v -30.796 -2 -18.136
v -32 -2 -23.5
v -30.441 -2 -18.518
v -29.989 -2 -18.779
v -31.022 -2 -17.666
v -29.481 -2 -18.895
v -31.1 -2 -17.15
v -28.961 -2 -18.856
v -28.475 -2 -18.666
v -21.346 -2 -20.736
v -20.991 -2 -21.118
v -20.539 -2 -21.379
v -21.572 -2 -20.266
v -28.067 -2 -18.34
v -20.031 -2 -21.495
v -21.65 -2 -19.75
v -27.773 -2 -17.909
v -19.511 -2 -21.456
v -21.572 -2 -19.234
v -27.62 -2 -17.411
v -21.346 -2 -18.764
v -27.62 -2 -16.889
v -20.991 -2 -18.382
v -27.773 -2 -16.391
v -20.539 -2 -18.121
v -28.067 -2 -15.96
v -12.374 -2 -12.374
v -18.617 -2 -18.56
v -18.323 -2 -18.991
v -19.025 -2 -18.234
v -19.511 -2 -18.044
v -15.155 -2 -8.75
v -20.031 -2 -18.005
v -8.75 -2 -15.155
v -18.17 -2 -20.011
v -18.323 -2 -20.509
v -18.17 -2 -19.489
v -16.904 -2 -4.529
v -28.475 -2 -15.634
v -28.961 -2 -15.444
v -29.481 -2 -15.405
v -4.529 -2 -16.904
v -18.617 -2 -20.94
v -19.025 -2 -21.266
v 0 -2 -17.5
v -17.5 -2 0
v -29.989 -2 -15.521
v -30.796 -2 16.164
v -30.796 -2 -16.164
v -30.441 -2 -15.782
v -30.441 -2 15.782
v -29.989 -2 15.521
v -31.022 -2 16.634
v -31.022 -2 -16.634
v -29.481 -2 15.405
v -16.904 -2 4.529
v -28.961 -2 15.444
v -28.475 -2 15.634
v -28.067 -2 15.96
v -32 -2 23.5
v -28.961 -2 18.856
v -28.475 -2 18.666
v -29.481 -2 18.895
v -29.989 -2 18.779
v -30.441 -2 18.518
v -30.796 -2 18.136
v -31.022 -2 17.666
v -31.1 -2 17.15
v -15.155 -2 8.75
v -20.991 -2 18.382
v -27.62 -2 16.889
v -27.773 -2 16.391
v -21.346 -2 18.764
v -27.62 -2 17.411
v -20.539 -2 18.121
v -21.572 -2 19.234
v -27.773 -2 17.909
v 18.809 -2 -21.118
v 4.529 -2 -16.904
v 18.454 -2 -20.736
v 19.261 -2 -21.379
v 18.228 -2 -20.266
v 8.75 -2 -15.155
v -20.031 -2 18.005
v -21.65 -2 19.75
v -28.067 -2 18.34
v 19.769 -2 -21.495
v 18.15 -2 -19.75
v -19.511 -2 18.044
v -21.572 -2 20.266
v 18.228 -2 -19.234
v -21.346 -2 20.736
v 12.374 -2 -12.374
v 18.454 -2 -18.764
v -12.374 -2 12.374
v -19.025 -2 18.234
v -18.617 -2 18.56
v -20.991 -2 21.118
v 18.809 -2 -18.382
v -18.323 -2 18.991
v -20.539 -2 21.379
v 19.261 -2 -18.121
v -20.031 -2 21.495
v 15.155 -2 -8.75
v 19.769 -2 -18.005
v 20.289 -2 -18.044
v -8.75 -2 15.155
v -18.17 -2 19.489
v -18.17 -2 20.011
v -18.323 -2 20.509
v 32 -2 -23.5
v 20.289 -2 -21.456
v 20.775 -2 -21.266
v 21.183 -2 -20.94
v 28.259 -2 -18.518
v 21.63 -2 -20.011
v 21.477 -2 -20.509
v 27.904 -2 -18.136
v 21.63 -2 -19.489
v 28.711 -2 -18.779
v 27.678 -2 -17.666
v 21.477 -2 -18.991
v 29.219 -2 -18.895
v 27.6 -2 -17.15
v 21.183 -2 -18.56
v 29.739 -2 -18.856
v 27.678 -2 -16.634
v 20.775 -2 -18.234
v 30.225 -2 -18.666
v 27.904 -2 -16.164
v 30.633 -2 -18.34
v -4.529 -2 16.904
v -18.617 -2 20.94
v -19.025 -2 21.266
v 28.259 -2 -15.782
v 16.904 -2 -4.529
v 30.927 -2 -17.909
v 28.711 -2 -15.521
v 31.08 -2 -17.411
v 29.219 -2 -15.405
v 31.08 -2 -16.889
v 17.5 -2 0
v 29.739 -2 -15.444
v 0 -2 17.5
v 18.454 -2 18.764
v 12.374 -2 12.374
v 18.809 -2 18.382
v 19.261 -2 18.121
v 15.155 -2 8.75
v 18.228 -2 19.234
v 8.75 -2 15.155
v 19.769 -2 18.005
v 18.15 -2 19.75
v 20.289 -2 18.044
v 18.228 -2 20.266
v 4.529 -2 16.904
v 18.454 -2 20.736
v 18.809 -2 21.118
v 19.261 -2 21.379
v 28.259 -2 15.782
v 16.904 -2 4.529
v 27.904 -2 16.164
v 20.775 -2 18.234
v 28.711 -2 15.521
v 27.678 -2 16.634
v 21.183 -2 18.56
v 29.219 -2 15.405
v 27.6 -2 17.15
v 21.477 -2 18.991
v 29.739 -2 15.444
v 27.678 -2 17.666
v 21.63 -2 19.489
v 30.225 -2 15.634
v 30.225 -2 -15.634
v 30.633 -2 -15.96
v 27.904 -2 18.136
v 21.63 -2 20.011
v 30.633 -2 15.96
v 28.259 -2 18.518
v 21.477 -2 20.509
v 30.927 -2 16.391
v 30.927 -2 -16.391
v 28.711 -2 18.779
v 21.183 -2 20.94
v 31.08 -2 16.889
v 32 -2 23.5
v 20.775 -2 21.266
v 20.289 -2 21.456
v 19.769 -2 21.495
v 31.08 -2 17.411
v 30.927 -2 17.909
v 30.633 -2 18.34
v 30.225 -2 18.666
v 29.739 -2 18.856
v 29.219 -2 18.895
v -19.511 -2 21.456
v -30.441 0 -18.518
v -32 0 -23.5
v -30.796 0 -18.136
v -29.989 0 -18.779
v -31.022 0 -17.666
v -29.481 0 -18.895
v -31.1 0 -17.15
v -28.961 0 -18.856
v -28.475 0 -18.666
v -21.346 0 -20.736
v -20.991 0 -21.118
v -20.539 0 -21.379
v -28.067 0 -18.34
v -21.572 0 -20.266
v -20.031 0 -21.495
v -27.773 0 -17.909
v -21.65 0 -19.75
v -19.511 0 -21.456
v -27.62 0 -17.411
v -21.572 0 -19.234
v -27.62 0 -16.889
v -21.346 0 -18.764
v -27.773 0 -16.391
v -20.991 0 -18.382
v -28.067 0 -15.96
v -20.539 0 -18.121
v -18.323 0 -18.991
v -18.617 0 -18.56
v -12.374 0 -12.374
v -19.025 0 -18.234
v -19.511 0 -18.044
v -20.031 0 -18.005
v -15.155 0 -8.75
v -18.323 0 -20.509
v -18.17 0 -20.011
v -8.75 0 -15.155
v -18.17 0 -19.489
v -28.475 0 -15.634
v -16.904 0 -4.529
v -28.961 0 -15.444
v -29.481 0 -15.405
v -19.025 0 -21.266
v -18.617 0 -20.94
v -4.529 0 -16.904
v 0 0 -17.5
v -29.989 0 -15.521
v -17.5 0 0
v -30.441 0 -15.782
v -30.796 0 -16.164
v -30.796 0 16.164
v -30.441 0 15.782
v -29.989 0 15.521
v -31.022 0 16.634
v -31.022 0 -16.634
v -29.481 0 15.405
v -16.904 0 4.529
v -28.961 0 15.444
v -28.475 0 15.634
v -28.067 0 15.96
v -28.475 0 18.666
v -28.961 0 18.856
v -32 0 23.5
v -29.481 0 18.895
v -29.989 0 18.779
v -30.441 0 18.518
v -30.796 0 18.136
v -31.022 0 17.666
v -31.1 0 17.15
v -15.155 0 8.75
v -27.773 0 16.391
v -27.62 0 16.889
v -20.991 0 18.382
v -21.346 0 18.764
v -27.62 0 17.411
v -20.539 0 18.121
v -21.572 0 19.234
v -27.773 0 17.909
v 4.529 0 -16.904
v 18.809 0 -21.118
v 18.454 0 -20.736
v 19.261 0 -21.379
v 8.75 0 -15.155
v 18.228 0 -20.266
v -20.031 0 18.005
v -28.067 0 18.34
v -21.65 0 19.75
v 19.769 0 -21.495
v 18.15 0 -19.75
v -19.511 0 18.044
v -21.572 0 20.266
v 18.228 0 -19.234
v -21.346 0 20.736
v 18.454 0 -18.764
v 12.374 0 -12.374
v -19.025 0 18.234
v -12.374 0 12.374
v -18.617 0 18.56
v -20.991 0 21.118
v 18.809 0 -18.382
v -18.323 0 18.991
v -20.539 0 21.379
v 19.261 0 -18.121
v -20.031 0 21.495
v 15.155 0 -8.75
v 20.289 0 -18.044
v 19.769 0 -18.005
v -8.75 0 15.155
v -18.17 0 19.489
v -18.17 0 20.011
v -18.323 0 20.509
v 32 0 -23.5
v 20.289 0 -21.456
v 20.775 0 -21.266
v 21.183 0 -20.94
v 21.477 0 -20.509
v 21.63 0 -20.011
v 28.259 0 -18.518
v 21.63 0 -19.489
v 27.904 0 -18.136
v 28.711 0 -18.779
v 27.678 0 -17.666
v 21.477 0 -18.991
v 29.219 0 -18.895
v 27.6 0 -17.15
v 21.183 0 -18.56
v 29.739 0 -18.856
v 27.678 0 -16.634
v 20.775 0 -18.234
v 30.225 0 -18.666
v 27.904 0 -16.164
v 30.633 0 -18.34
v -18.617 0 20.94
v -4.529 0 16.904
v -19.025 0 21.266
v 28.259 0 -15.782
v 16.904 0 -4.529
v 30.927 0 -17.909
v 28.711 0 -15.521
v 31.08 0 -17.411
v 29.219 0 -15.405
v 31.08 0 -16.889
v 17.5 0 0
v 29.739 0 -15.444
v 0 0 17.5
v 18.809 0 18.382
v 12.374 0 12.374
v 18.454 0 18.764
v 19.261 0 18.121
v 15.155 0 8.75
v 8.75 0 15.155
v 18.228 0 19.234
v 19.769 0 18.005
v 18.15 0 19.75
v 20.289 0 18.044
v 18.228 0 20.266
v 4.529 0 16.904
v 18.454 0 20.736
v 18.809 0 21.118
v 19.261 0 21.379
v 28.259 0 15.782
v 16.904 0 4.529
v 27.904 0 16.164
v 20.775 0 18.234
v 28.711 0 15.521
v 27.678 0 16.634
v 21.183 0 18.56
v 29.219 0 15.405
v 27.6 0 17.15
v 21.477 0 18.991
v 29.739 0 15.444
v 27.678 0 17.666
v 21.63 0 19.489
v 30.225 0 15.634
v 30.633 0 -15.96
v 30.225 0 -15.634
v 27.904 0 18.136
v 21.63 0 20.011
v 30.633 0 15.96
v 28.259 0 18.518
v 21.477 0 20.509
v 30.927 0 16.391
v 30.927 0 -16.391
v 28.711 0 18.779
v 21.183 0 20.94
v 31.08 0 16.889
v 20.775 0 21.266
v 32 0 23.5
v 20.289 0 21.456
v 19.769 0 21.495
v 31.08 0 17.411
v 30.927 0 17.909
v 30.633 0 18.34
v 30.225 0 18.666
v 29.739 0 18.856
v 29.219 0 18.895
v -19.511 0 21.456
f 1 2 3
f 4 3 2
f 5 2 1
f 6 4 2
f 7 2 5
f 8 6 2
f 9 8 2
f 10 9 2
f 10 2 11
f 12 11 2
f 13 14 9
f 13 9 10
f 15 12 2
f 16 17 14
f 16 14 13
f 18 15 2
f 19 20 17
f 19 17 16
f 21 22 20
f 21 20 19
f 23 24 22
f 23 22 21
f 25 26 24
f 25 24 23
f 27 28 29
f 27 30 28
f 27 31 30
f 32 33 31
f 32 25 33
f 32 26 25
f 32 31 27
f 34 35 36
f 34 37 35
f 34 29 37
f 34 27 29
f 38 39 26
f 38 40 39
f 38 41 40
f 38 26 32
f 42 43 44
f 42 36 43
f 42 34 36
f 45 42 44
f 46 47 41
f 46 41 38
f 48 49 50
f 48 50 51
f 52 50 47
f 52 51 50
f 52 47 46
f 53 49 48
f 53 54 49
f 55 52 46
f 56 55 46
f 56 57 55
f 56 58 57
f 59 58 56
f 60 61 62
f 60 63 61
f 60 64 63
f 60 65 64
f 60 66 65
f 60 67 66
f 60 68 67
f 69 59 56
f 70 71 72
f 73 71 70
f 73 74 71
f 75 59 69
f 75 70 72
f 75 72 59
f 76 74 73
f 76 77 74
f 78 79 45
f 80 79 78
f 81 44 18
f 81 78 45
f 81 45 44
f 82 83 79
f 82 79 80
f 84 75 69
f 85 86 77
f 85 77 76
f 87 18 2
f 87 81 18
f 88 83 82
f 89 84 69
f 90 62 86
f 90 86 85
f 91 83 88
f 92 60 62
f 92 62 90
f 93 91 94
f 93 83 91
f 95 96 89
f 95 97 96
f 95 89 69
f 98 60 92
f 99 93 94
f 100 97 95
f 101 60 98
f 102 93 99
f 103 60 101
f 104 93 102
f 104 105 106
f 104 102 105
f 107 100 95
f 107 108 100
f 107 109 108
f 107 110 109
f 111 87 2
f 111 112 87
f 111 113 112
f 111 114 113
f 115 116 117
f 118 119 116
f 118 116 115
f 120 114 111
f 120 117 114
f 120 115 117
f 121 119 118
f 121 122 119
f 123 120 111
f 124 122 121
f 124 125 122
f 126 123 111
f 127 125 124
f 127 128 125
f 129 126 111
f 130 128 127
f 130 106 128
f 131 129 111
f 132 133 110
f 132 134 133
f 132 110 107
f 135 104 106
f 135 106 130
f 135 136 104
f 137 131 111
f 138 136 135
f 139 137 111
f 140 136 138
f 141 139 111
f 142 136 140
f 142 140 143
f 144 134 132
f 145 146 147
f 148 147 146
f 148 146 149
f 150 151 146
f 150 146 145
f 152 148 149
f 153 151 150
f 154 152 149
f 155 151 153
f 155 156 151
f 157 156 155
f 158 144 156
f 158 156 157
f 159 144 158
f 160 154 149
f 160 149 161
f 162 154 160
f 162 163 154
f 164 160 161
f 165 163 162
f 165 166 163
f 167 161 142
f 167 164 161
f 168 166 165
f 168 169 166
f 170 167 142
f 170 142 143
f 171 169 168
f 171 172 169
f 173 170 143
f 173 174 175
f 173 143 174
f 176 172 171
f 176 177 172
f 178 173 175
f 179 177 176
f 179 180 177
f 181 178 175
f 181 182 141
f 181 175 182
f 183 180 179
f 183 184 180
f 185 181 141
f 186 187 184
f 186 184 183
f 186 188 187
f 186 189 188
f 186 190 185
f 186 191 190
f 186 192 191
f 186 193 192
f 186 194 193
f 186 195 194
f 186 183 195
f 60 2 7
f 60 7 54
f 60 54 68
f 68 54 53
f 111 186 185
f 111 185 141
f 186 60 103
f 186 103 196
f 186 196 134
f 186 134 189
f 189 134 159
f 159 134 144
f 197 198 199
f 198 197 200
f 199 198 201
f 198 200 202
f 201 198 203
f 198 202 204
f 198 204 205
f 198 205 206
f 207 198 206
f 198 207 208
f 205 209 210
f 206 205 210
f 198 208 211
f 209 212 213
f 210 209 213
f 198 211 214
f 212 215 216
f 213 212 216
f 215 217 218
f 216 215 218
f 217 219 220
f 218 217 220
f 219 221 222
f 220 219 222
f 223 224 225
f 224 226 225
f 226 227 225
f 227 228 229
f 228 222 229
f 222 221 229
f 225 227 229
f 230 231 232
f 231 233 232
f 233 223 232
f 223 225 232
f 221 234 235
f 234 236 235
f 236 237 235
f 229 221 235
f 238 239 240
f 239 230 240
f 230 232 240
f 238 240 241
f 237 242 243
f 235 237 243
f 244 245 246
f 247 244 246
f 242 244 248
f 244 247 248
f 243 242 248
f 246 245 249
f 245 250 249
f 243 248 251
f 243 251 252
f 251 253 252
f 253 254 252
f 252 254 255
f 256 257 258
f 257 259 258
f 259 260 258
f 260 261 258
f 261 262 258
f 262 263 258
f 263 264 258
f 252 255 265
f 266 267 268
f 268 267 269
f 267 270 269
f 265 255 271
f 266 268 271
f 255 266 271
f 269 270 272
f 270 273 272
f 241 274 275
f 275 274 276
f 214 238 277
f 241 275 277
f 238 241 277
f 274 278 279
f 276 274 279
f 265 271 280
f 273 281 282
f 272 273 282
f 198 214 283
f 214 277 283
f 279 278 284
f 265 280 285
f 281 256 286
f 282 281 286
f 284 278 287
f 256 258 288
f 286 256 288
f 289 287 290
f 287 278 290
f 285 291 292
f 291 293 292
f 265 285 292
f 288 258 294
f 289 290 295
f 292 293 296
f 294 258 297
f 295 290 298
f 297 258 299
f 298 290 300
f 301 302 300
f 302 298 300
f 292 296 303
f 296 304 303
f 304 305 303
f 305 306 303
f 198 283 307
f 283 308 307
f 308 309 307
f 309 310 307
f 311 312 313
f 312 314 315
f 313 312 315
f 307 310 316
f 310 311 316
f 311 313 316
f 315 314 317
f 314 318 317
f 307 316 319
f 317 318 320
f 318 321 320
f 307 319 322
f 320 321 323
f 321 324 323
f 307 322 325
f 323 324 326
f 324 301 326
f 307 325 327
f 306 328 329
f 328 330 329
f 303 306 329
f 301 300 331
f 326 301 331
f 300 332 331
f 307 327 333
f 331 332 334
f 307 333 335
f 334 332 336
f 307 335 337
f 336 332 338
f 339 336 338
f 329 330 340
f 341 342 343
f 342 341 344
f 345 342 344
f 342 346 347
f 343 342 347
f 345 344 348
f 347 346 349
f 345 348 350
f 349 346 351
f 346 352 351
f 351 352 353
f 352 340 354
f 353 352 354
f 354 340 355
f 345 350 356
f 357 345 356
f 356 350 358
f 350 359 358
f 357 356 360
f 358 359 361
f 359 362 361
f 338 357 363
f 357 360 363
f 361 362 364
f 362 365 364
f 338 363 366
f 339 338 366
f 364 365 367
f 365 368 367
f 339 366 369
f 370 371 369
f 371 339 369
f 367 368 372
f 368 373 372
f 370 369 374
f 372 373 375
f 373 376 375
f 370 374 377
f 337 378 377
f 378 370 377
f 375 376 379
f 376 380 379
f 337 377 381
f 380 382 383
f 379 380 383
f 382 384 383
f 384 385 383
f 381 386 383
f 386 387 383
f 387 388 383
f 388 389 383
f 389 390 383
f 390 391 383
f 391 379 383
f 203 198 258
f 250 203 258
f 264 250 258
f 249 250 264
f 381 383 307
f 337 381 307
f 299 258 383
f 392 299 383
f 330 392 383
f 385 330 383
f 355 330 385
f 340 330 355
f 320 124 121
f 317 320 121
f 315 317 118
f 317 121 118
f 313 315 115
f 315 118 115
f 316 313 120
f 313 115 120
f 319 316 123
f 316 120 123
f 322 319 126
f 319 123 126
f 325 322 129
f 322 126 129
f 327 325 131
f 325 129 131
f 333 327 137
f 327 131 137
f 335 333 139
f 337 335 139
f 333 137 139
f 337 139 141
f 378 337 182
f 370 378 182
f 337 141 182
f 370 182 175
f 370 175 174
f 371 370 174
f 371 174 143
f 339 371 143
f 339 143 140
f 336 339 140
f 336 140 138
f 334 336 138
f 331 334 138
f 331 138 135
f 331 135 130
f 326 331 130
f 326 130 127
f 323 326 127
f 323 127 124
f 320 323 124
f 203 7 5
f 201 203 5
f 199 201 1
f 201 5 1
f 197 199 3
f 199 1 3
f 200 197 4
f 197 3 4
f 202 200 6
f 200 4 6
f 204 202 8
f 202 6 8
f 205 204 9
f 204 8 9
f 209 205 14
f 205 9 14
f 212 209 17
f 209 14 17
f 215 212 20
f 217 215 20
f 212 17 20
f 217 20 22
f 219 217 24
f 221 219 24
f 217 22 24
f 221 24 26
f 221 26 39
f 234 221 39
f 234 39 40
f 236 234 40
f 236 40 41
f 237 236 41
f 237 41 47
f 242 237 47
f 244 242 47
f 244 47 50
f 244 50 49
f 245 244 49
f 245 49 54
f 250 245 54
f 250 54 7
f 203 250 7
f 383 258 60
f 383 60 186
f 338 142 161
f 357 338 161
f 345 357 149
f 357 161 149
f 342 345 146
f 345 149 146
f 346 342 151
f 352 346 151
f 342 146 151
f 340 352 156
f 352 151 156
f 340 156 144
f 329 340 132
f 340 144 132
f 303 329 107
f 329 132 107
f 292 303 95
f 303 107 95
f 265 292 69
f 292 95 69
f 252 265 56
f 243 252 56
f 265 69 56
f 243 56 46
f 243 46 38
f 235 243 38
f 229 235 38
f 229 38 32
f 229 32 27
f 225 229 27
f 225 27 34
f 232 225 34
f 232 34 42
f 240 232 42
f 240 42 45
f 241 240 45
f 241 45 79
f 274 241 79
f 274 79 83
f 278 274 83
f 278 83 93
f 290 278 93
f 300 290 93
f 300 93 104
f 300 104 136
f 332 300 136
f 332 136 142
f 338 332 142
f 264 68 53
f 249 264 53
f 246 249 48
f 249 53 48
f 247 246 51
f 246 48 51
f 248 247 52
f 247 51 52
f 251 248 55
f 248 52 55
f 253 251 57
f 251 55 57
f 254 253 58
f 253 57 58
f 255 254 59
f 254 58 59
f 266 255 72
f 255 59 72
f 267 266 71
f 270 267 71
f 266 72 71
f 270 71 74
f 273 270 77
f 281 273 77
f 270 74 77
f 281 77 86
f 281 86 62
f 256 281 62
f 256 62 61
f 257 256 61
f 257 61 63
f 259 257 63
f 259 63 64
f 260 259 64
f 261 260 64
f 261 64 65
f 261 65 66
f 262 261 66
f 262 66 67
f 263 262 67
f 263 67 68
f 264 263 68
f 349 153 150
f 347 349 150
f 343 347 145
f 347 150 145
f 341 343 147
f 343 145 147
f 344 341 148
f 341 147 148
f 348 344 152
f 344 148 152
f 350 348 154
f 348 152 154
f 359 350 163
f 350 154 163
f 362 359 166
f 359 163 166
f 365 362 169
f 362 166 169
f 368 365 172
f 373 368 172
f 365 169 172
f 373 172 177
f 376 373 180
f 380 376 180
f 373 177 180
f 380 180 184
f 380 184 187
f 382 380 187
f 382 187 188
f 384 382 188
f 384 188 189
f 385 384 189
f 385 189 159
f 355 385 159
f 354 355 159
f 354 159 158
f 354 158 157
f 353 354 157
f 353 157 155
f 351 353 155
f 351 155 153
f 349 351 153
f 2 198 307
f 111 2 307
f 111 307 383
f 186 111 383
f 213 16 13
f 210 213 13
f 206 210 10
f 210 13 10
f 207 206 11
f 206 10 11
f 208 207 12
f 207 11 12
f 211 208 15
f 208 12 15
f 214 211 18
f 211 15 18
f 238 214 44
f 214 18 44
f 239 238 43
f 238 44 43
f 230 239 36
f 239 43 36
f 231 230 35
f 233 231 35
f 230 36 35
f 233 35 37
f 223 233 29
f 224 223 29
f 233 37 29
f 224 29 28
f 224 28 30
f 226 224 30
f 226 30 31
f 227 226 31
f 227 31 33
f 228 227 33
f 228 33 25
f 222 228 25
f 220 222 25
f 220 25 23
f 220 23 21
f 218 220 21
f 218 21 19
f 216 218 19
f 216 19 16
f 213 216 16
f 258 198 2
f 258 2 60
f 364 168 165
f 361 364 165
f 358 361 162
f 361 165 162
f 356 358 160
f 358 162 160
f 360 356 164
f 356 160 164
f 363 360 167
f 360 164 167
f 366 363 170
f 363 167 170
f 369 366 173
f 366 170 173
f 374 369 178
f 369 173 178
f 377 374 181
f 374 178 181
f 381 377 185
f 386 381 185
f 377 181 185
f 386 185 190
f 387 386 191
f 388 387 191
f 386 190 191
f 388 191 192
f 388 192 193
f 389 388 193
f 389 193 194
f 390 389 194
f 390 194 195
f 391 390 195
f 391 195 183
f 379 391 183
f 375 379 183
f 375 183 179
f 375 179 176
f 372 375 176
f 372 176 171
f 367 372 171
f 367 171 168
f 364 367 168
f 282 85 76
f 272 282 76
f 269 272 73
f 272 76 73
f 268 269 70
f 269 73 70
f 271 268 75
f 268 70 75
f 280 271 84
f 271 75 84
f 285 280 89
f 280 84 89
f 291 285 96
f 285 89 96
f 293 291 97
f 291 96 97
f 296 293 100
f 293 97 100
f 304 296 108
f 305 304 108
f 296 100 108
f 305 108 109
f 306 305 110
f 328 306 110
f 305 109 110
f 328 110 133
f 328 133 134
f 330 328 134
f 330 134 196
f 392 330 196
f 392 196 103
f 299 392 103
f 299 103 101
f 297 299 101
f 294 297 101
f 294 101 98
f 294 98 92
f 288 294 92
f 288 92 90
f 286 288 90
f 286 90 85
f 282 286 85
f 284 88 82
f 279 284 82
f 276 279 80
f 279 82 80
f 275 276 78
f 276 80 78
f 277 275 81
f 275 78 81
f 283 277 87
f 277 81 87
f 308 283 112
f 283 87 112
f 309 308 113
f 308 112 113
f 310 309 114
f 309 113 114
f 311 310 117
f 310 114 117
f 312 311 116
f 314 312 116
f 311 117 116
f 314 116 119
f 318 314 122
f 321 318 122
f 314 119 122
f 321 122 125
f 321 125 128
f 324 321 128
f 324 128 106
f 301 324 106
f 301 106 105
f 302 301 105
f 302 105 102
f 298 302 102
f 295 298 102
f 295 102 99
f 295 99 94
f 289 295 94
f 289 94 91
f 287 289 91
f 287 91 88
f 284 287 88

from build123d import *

# Parameters (mm, degrees)
F0_W     = 64
F0_H     = 47
F1_DEPTH = 2
F2_D     = 3.5
F3_R     = 17.5
F4_DEPTH = 25


with BuildPart() as f1:
    # F0 (on Front) → F1 (new body)
    with BuildSketch(Plane.XZ):
        Rectangle(F0_W, F0_H)
    extrude(amount=F1_DEPTH)

    # F2 (through all)
    with Locations(Plane(origin=(0, 0, 0), x_dir=(1, 0, 0), z_dir=(0, 1, 0))):
        with Locations((-29.35, 17.15), (-19.9, 19.75), (19.9, 19.75), (29.35, 17.15), (29.35, -17.15), (19.9, -19.75), (-19.9, -19.75), (-29.35, -17.15)):
            Hole(F2_D / 2)

    # F3 (on face) → F4 (cut)
    with BuildSketch(Plane.XZ.offset(2)):
        Circle(F3_R)
    extrude(amount=-F4_DEPTH, mode=Mode.SUBTRACT)


solid = f1.part
